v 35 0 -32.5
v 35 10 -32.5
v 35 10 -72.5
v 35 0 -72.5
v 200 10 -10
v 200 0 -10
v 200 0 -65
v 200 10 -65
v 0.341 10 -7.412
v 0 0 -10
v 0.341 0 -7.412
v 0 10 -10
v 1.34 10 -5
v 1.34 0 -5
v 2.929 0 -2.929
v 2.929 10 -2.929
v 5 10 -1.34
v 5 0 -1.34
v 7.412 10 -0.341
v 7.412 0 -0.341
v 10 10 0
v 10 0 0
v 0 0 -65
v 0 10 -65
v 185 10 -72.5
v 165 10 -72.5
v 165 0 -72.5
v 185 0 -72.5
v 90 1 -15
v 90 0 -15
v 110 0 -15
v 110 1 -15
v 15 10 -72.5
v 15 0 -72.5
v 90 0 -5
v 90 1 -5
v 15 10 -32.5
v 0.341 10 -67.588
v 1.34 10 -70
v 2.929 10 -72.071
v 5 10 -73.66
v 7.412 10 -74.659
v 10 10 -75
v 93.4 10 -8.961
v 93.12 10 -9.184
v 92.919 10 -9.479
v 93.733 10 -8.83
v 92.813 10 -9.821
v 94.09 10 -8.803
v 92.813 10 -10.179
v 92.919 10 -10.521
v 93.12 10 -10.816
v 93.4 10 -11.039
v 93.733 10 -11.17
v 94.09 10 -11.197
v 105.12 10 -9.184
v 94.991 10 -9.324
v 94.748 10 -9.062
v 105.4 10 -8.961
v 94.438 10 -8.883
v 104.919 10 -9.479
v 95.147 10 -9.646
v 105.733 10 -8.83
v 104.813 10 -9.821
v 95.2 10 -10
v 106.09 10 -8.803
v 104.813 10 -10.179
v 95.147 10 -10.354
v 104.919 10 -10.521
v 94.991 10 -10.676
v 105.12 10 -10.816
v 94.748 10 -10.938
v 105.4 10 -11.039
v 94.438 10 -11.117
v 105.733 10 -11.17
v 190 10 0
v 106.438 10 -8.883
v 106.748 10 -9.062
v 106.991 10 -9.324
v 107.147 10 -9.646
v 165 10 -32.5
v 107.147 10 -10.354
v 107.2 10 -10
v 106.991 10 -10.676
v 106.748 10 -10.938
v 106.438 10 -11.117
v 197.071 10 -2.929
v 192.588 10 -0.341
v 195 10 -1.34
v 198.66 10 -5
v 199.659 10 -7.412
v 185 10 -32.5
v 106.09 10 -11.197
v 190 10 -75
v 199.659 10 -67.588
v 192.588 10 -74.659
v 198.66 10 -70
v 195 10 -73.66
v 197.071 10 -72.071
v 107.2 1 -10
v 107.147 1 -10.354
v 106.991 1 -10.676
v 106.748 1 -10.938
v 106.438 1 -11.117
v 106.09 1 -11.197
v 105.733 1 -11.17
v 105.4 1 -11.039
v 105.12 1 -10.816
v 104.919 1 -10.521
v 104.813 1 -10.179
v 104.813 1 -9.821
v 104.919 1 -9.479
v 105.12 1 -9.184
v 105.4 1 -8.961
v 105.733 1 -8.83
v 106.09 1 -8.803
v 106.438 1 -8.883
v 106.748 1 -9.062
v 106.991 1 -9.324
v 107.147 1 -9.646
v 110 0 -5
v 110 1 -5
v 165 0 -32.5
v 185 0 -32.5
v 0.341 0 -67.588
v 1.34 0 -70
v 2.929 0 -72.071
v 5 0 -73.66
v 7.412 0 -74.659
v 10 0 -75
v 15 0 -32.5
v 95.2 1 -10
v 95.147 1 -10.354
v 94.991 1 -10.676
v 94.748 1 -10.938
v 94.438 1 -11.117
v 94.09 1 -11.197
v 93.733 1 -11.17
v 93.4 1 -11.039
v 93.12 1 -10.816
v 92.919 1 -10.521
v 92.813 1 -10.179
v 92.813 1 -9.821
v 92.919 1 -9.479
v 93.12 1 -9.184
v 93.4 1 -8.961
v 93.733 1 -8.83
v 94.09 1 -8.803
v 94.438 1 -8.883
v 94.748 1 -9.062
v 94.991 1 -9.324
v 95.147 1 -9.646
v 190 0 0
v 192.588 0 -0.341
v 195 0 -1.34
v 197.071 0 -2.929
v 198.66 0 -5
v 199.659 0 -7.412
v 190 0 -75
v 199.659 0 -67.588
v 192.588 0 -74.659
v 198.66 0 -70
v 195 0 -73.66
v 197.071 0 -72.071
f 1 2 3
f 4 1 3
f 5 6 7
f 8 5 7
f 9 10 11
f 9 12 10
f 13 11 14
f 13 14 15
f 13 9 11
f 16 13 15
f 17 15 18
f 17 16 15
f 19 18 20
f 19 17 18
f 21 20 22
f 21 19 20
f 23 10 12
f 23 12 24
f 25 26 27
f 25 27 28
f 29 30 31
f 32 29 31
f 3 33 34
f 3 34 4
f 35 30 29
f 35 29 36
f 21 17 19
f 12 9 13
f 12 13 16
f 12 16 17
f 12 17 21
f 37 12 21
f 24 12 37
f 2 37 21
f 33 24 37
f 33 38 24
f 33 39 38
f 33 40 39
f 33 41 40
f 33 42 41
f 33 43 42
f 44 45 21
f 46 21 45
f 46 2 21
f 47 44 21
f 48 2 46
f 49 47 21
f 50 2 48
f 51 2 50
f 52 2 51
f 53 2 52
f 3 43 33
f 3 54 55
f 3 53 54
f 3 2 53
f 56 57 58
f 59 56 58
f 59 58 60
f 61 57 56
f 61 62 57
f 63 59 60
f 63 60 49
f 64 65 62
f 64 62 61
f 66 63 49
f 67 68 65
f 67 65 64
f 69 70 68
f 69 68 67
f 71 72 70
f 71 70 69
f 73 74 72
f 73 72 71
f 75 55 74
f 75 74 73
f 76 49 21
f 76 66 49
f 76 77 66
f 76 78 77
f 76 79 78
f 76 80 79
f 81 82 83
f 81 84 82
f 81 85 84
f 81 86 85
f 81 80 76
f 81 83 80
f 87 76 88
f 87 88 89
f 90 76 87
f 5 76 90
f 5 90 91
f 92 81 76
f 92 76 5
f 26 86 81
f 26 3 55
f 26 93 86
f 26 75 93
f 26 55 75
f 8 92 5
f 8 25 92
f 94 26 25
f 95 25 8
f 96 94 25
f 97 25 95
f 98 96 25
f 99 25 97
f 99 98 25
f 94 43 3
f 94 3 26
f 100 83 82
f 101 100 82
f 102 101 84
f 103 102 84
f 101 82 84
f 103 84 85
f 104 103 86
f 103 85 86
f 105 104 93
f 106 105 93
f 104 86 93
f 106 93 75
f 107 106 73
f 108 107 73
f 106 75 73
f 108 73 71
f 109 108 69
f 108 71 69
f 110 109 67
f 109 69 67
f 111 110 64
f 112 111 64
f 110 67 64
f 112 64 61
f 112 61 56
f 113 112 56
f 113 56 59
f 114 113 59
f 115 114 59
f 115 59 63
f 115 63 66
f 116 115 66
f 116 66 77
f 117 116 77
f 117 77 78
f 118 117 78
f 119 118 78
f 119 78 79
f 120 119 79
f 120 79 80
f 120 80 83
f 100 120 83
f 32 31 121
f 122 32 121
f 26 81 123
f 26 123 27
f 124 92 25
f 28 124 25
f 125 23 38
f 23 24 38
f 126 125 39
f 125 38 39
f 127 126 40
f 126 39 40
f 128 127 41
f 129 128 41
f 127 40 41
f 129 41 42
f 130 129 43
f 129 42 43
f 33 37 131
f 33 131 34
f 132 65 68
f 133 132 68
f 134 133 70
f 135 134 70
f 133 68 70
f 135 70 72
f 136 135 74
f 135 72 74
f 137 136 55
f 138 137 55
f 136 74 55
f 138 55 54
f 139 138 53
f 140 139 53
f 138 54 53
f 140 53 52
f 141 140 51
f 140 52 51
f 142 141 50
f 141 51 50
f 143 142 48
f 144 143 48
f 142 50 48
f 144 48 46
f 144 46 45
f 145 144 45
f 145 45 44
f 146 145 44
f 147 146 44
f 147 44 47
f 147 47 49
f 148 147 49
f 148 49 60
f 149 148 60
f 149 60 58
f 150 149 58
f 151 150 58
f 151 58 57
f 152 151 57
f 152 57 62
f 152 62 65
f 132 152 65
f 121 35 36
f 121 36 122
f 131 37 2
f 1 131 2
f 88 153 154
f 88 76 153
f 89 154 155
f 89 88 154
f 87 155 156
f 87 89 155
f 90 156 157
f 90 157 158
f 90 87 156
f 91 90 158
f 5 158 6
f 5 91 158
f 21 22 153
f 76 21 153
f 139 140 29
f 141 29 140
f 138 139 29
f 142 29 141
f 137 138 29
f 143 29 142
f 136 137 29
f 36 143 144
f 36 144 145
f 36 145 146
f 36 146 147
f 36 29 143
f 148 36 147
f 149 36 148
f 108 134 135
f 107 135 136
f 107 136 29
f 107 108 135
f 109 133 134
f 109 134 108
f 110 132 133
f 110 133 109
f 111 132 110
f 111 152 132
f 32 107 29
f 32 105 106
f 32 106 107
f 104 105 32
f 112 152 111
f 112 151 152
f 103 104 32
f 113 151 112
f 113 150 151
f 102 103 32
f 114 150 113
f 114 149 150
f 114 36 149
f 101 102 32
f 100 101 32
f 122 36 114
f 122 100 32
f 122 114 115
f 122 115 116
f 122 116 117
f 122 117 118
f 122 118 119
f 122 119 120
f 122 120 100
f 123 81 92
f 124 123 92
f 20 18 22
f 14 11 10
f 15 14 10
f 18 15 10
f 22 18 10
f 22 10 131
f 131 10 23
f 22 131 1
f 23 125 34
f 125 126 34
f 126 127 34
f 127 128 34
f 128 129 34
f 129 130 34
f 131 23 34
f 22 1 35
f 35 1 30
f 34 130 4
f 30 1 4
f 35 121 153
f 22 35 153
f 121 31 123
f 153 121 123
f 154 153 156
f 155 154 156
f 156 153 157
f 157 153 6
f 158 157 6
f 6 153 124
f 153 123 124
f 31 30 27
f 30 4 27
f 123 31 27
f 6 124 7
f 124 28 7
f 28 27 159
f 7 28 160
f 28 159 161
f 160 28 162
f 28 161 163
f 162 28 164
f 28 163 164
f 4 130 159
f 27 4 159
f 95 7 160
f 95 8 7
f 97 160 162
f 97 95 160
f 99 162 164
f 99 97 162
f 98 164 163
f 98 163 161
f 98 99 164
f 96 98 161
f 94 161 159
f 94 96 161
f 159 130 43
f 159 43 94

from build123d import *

# Parameters (mm, degrees)
ESQUISSE1_W             = 200
ESQUISSE1_H             = 75
BOSS_EXTRU_1_DEPTH      = 10
CONG_1_R                = 10
ESQUISSE2_W             = 20
ESQUISSE2_H             = 40
ENL_V_MAT_EXTRU_1_DEPTH = 10
ESQUISSE3_W             = 20
ESQUISSE3_H             = 10
ENL_V_MAT_EXTRU_2_DEPTH = 1
D_GAGEMENT_M21_D        = 2.4


with BuildPart() as part:
    # Esquisse1 → Boss.-Extru.1 (new body)
    with BuildSketch(Plane(origin=(0, 0, 0), x_dir=(1, 0, 0), z_dir=(0, 1, 0))):
        with Locations((100, 37.5)):
            Rectangle(ESQUISSE1_W, ESQUISSE1_H)
    extrude(amount=BOSS_EXTRU_1_DEPTH)

    # Cong_1
    cong_1_edges = [part.edges().sort_by_distance(p)[0] for p in [
        (0, 5, -75),
        (200, 5, -75),
        (200, 5, 0),
        (0, 5, 0),
    ]]
    fillet(cong_1_edges, radius=CONG_1_R)

    # Esquisse2 → Enl_v. mat.-Extru.1 (cut)
    with BuildSketch(Plane(origin=(0, 10, 0), x_dir=(1, 0, 0), z_dir=(0, 1, 0))):
        with Locations((25, 52.5)):
            Rectangle(ESQUISSE2_W, ESQUISSE2_H)
        with Locations((175, 52.5)):
            Rectangle(ESQUISSE2_W, ESQUISSE2_H)
    extrude(amount=-ENL_V_MAT_EXTRU_1_DEPTH, mode=Mode.SUBTRACT)

    # Esquisse3 → Enl_v. mat.-Extru.2 (cut)
    with BuildSketch(Plane.XZ):
        with Locations((100, -10)):
            Rectangle(ESQUISSE3_W, ESQUISSE3_H)
    extrude(amount=-ENL_V_MAT_EXTRU_2_DEPTH, mode=Mode.SUBTRACT)

    # D_gagement M21 (through all)
    with Locations(Plane(origin=(0, 1, 0), x_dir=(-1, 0, 0), z_dir=(0, -1, 0))):
        with Locations((-106, 10), (-94, 10)):
            Hole(D_GAGEMENT_M21_D / 2)


solid = part.part
